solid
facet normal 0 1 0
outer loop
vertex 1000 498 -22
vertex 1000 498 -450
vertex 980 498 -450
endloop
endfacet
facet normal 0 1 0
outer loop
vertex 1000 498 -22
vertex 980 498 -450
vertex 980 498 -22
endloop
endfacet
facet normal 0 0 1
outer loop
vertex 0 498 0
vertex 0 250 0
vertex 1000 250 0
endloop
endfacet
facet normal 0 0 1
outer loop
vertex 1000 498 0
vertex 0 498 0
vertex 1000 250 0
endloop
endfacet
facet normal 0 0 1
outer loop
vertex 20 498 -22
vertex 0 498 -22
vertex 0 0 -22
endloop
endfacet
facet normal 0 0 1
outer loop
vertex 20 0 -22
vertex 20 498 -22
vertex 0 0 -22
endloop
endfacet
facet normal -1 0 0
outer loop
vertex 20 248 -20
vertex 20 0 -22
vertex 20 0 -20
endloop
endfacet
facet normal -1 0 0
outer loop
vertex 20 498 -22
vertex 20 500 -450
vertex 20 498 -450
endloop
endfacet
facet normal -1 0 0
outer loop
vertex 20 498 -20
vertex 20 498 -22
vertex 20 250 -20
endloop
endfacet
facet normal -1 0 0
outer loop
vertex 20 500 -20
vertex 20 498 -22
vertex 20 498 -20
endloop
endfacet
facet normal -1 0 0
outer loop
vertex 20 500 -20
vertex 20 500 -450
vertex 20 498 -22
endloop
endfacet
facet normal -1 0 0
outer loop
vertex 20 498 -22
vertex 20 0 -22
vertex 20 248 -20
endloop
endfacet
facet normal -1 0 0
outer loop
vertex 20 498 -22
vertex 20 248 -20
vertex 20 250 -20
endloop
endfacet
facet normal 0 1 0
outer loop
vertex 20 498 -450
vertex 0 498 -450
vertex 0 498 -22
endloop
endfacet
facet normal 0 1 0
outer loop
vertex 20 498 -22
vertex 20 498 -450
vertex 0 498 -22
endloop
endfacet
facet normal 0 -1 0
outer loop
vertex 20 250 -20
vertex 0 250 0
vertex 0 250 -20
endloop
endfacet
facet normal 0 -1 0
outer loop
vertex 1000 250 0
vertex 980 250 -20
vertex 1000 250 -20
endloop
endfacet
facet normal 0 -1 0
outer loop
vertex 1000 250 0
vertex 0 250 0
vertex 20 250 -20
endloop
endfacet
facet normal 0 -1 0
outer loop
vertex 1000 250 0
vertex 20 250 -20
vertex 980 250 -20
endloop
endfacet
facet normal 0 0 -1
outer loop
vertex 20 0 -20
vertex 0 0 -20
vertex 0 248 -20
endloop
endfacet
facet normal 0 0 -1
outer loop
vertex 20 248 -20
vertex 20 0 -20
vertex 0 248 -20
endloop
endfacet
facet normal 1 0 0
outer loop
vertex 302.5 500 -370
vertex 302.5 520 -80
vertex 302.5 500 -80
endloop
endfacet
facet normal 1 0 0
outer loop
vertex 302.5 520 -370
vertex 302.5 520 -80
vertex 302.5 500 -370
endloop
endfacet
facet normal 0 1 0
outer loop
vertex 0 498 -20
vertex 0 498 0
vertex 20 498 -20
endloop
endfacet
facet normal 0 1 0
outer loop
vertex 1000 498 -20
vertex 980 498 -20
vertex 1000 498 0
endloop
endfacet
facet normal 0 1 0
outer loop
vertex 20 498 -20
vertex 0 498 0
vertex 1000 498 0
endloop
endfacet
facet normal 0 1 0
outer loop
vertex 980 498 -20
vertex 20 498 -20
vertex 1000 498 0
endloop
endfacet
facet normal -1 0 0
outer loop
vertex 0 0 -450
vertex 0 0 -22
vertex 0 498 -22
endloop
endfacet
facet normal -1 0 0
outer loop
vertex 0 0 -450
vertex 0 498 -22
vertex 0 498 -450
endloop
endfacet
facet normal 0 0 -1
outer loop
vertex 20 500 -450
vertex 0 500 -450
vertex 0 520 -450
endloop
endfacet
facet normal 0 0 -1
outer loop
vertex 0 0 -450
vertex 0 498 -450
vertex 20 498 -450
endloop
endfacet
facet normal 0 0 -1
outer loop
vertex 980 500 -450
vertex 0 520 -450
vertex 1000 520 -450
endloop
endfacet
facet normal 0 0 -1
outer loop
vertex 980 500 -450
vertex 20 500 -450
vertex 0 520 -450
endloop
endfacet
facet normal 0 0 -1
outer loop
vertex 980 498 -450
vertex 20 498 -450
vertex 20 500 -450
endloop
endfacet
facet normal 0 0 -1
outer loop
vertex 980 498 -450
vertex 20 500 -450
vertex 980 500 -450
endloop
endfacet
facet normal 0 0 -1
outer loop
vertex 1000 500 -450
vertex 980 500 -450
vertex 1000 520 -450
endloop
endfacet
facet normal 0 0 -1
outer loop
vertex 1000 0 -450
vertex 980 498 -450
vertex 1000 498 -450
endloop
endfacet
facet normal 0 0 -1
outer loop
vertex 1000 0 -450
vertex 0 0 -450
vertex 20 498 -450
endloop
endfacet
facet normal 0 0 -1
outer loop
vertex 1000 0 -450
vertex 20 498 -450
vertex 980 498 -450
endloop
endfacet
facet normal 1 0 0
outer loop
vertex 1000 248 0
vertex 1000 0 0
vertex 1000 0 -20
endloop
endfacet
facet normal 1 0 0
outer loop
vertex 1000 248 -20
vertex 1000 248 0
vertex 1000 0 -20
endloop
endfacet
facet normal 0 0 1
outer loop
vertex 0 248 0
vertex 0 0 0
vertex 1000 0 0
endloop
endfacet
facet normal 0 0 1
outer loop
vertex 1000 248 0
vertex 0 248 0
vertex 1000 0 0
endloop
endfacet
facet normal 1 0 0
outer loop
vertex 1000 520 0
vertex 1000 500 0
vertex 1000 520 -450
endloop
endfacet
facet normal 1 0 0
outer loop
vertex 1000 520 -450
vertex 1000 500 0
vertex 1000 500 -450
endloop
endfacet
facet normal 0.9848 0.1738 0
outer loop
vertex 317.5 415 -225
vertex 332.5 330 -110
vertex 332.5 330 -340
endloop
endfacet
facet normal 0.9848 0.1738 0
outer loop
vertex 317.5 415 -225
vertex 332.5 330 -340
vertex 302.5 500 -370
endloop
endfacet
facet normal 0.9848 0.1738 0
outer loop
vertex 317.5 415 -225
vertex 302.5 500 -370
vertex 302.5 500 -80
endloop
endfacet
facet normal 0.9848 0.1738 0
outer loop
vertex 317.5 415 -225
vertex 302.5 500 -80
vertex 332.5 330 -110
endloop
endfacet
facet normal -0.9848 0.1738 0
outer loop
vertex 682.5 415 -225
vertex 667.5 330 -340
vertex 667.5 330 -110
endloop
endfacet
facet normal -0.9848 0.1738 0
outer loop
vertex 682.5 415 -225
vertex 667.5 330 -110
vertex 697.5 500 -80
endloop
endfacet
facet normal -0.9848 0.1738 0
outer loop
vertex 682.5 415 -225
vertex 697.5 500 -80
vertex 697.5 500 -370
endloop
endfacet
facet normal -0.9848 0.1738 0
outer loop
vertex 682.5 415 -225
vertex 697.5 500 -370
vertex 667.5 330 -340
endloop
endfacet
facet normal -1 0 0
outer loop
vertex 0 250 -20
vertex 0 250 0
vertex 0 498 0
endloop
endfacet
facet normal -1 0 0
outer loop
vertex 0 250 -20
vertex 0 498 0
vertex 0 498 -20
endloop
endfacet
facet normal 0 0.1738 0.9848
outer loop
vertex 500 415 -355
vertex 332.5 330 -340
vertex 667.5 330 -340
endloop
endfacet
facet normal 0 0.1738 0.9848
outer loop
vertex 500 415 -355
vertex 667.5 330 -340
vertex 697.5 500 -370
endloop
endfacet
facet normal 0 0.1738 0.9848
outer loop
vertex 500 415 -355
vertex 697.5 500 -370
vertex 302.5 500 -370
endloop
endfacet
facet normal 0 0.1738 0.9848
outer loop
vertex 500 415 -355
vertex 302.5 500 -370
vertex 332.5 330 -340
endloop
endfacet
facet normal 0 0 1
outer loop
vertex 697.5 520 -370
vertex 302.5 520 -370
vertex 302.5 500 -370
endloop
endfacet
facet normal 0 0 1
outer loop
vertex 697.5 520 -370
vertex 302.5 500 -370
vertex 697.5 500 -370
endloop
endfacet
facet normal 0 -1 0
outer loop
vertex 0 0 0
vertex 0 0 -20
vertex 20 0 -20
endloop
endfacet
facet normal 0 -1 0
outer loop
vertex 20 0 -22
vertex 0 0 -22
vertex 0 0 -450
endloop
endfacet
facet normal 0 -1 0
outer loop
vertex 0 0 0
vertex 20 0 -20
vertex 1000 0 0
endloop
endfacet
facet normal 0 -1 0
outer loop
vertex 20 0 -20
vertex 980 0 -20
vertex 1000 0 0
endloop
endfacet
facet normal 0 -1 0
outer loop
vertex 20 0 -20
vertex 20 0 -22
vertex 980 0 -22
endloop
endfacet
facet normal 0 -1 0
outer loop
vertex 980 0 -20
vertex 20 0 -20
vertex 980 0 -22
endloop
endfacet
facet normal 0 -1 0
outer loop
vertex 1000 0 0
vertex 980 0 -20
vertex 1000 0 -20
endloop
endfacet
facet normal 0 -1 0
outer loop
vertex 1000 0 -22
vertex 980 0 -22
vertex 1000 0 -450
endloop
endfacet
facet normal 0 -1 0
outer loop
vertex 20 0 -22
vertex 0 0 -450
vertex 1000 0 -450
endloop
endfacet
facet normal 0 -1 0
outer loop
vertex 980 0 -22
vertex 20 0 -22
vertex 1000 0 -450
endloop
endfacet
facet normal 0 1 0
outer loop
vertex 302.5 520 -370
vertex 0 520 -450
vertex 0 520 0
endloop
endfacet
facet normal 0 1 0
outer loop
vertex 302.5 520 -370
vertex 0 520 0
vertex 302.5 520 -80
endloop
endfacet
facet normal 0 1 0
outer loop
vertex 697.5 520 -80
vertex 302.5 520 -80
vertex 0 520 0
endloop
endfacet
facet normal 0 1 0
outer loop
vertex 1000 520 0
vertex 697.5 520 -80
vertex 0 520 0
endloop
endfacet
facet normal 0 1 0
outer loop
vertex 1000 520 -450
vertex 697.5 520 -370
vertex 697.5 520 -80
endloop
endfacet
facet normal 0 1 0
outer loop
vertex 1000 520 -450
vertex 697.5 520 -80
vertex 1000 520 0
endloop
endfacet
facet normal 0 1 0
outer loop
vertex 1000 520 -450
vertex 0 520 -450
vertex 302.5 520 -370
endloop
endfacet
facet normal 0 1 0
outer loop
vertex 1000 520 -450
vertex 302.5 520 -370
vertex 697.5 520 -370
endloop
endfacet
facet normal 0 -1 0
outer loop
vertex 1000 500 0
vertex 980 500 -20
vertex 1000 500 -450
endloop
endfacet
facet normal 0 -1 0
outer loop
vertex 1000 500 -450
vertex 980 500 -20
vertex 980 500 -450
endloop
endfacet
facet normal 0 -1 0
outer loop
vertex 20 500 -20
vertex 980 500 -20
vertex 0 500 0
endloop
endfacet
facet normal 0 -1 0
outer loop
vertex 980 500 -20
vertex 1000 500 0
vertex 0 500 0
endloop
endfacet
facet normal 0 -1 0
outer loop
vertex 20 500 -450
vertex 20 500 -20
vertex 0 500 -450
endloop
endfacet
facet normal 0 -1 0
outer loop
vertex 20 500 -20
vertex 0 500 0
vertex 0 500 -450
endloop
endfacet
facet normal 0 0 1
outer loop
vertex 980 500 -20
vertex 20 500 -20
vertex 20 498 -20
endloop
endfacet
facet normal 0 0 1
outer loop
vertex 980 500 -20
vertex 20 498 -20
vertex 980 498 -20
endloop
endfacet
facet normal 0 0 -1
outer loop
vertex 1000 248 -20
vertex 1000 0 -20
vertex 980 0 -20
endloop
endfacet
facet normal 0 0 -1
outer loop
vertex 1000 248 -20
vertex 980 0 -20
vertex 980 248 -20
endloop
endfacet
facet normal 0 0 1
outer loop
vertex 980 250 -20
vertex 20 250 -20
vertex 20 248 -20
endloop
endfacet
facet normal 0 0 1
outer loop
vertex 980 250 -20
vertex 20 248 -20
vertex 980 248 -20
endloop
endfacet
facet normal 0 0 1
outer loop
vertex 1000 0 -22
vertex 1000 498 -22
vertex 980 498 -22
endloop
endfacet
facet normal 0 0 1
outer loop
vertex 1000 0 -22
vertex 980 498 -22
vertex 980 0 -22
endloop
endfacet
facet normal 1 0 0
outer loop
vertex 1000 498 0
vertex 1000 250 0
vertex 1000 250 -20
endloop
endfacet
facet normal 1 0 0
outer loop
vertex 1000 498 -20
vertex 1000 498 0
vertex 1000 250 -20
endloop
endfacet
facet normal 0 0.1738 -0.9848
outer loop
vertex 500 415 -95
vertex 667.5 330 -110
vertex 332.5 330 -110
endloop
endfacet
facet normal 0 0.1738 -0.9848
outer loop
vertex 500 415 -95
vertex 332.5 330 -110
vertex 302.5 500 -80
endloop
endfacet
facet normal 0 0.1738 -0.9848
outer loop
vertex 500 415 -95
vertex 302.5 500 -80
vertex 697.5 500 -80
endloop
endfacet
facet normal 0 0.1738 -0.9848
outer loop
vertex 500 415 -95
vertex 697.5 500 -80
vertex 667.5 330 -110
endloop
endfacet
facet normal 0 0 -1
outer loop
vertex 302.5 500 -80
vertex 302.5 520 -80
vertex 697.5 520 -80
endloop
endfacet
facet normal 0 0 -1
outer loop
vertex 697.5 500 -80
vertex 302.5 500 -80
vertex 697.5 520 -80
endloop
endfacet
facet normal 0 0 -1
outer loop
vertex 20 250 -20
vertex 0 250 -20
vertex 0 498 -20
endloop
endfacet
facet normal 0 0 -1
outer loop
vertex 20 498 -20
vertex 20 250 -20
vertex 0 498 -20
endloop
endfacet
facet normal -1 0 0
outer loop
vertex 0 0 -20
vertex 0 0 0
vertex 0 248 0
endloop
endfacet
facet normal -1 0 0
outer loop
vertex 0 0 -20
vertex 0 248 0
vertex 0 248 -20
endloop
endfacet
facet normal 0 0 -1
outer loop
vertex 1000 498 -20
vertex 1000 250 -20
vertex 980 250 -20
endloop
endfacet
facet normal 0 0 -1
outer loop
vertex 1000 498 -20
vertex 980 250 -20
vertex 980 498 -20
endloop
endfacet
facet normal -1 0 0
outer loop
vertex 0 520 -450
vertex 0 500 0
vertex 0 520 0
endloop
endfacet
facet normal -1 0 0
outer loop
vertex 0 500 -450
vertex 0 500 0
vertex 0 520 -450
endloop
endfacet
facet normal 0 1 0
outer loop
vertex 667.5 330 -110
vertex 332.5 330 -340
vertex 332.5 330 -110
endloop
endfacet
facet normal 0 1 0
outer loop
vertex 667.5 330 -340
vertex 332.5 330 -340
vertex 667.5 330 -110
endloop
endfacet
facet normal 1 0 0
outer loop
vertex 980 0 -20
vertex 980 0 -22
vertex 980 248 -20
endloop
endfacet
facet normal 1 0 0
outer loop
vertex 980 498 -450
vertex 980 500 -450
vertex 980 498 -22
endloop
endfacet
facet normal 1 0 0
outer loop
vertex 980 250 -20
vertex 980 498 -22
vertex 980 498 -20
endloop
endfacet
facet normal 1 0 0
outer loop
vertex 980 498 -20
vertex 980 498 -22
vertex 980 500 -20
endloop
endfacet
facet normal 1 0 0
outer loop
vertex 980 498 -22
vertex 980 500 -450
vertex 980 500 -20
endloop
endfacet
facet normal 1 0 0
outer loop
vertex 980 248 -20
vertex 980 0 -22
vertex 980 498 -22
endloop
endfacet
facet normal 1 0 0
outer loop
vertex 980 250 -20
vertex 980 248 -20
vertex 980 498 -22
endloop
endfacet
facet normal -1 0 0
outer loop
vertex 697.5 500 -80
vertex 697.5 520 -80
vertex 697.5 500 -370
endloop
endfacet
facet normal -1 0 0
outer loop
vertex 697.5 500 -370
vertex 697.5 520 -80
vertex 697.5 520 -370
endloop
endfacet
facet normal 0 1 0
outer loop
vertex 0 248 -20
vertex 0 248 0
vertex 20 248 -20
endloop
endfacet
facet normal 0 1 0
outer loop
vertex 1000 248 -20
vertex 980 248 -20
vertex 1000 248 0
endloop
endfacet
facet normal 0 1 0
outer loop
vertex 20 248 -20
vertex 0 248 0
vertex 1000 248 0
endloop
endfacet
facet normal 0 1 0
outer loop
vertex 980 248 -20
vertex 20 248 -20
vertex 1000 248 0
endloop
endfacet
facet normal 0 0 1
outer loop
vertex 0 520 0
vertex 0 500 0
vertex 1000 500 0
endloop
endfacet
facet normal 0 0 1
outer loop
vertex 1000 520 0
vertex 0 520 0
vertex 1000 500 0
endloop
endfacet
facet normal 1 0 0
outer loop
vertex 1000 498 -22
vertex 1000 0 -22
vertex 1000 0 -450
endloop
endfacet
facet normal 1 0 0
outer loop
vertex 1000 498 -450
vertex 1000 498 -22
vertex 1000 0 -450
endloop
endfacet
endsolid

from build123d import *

# Parameters (mm, degrees)
SKETCH_1_W          = 1000
SKETCH_1_H          = 450
EXTRUDE_1_DEPTH     = 520
SKETCH_2_W          = 395
SKETCH_2_H          = 290
CUT_EXTRUDE_1_DEPTH = 20
SKETCH_8_W          = 1000
SKETCH_8_H          = 2
CUT_EXTRUDE_2_DEPTH = 20
CUT_EXTRUDE_3_DEPTH = 20


with BuildPart() as part:
    # Эскиз1 → Бобышка-Вытянуть1 (new body)
    with BuildSketch(Plane(origin=(0, 0, 0), x_dir=(1, 0, 0), z_dir=(0, 1, 0))):
        with Locations((500, 225)):
            Rectangle(SKETCH_1_W, SKETCH_1_H)
    extrude(amount=EXTRUDE_1_DEPTH)

    # Эскиз2 → Вырез-Вытянуть1 (cut)
    with BuildSketch(Plane(origin=(0, 520, 0), x_dir=(1, 0, 0), z_dir=(0, 1, 0))):
        with Locations((500, 225)):
            Rectangle(SKETCH_2_W, SKETCH_2_H)
    extrude(amount=-CUT_EXTRUDE_1_DEPTH, mode=Mode.SUBTRACT)

    # Эскиз3 → Вырез-По сечениям1 section 0
    with BuildSketch(Plane(origin=(0, 330, 0), x_dir=(1, 0, 0), z_dir=(0, 1, 0))):
        with BuildLine():
            Line((332.5, 340), (667.5, 340))
            Line((667.5, 340), (667.5, 110))
            Line((667.5, 110), (332.5, 110))
            Line((332.5, 110), (332.5, 340))
        make_face()
    # Эскиз4 → Вырез-По сечениям1 section 1
    with BuildSketch(Plane(origin=(0, 500, 0), x_dir=(1, 0, 0), z_dir=(0, 1, 0))):
        with BuildLine():
            Line((302.5, 370), (697.5, 370))
            Line((697.5, 370), (697.5, 80))
            Line((697.5, 80), (302.5, 80))
            Line((302.5, 80), (302.5, 370))
        make_face()
    loft(mode=Mode.SUBTRACT)

    # Эскиз8 → Вырез-Вытянуть2 (cut)
    with BuildSketch(Plane.XY):
        with Locations((500, 499)):
            Rectangle(SKETCH_8_W, SKETCH_8_H)
        with Locations((500, 249)):
            Rectangle(SKETCH_8_W, SKETCH_8_H)
    extrude(amount=-CUT_EXTRUDE_2_DEPTH, mode=Mode.SUBTRACT)

    # Эскиз9 → Вырез-Вытянуть3 (cut)
    with BuildSketch(Plane.ZY):
        Polygon((-20, 500), (-450, 500), (-450, 498), (-22, 498), (-22, 0), (-20, 0), (-20, 498), align=None)
    cut_extrude_3 = extrude(amount=-CUT_EXTRUDE_3_DEPTH, mode=Mode.SUBTRACT)

    # Зеркальное отражение1: Вырез-Вытянуть3 across plane
    add(cut_extrude_3.mirror(Plane.ZY.offset(-500)), mode=Mode.SUBTRACT)


solid = part.part
